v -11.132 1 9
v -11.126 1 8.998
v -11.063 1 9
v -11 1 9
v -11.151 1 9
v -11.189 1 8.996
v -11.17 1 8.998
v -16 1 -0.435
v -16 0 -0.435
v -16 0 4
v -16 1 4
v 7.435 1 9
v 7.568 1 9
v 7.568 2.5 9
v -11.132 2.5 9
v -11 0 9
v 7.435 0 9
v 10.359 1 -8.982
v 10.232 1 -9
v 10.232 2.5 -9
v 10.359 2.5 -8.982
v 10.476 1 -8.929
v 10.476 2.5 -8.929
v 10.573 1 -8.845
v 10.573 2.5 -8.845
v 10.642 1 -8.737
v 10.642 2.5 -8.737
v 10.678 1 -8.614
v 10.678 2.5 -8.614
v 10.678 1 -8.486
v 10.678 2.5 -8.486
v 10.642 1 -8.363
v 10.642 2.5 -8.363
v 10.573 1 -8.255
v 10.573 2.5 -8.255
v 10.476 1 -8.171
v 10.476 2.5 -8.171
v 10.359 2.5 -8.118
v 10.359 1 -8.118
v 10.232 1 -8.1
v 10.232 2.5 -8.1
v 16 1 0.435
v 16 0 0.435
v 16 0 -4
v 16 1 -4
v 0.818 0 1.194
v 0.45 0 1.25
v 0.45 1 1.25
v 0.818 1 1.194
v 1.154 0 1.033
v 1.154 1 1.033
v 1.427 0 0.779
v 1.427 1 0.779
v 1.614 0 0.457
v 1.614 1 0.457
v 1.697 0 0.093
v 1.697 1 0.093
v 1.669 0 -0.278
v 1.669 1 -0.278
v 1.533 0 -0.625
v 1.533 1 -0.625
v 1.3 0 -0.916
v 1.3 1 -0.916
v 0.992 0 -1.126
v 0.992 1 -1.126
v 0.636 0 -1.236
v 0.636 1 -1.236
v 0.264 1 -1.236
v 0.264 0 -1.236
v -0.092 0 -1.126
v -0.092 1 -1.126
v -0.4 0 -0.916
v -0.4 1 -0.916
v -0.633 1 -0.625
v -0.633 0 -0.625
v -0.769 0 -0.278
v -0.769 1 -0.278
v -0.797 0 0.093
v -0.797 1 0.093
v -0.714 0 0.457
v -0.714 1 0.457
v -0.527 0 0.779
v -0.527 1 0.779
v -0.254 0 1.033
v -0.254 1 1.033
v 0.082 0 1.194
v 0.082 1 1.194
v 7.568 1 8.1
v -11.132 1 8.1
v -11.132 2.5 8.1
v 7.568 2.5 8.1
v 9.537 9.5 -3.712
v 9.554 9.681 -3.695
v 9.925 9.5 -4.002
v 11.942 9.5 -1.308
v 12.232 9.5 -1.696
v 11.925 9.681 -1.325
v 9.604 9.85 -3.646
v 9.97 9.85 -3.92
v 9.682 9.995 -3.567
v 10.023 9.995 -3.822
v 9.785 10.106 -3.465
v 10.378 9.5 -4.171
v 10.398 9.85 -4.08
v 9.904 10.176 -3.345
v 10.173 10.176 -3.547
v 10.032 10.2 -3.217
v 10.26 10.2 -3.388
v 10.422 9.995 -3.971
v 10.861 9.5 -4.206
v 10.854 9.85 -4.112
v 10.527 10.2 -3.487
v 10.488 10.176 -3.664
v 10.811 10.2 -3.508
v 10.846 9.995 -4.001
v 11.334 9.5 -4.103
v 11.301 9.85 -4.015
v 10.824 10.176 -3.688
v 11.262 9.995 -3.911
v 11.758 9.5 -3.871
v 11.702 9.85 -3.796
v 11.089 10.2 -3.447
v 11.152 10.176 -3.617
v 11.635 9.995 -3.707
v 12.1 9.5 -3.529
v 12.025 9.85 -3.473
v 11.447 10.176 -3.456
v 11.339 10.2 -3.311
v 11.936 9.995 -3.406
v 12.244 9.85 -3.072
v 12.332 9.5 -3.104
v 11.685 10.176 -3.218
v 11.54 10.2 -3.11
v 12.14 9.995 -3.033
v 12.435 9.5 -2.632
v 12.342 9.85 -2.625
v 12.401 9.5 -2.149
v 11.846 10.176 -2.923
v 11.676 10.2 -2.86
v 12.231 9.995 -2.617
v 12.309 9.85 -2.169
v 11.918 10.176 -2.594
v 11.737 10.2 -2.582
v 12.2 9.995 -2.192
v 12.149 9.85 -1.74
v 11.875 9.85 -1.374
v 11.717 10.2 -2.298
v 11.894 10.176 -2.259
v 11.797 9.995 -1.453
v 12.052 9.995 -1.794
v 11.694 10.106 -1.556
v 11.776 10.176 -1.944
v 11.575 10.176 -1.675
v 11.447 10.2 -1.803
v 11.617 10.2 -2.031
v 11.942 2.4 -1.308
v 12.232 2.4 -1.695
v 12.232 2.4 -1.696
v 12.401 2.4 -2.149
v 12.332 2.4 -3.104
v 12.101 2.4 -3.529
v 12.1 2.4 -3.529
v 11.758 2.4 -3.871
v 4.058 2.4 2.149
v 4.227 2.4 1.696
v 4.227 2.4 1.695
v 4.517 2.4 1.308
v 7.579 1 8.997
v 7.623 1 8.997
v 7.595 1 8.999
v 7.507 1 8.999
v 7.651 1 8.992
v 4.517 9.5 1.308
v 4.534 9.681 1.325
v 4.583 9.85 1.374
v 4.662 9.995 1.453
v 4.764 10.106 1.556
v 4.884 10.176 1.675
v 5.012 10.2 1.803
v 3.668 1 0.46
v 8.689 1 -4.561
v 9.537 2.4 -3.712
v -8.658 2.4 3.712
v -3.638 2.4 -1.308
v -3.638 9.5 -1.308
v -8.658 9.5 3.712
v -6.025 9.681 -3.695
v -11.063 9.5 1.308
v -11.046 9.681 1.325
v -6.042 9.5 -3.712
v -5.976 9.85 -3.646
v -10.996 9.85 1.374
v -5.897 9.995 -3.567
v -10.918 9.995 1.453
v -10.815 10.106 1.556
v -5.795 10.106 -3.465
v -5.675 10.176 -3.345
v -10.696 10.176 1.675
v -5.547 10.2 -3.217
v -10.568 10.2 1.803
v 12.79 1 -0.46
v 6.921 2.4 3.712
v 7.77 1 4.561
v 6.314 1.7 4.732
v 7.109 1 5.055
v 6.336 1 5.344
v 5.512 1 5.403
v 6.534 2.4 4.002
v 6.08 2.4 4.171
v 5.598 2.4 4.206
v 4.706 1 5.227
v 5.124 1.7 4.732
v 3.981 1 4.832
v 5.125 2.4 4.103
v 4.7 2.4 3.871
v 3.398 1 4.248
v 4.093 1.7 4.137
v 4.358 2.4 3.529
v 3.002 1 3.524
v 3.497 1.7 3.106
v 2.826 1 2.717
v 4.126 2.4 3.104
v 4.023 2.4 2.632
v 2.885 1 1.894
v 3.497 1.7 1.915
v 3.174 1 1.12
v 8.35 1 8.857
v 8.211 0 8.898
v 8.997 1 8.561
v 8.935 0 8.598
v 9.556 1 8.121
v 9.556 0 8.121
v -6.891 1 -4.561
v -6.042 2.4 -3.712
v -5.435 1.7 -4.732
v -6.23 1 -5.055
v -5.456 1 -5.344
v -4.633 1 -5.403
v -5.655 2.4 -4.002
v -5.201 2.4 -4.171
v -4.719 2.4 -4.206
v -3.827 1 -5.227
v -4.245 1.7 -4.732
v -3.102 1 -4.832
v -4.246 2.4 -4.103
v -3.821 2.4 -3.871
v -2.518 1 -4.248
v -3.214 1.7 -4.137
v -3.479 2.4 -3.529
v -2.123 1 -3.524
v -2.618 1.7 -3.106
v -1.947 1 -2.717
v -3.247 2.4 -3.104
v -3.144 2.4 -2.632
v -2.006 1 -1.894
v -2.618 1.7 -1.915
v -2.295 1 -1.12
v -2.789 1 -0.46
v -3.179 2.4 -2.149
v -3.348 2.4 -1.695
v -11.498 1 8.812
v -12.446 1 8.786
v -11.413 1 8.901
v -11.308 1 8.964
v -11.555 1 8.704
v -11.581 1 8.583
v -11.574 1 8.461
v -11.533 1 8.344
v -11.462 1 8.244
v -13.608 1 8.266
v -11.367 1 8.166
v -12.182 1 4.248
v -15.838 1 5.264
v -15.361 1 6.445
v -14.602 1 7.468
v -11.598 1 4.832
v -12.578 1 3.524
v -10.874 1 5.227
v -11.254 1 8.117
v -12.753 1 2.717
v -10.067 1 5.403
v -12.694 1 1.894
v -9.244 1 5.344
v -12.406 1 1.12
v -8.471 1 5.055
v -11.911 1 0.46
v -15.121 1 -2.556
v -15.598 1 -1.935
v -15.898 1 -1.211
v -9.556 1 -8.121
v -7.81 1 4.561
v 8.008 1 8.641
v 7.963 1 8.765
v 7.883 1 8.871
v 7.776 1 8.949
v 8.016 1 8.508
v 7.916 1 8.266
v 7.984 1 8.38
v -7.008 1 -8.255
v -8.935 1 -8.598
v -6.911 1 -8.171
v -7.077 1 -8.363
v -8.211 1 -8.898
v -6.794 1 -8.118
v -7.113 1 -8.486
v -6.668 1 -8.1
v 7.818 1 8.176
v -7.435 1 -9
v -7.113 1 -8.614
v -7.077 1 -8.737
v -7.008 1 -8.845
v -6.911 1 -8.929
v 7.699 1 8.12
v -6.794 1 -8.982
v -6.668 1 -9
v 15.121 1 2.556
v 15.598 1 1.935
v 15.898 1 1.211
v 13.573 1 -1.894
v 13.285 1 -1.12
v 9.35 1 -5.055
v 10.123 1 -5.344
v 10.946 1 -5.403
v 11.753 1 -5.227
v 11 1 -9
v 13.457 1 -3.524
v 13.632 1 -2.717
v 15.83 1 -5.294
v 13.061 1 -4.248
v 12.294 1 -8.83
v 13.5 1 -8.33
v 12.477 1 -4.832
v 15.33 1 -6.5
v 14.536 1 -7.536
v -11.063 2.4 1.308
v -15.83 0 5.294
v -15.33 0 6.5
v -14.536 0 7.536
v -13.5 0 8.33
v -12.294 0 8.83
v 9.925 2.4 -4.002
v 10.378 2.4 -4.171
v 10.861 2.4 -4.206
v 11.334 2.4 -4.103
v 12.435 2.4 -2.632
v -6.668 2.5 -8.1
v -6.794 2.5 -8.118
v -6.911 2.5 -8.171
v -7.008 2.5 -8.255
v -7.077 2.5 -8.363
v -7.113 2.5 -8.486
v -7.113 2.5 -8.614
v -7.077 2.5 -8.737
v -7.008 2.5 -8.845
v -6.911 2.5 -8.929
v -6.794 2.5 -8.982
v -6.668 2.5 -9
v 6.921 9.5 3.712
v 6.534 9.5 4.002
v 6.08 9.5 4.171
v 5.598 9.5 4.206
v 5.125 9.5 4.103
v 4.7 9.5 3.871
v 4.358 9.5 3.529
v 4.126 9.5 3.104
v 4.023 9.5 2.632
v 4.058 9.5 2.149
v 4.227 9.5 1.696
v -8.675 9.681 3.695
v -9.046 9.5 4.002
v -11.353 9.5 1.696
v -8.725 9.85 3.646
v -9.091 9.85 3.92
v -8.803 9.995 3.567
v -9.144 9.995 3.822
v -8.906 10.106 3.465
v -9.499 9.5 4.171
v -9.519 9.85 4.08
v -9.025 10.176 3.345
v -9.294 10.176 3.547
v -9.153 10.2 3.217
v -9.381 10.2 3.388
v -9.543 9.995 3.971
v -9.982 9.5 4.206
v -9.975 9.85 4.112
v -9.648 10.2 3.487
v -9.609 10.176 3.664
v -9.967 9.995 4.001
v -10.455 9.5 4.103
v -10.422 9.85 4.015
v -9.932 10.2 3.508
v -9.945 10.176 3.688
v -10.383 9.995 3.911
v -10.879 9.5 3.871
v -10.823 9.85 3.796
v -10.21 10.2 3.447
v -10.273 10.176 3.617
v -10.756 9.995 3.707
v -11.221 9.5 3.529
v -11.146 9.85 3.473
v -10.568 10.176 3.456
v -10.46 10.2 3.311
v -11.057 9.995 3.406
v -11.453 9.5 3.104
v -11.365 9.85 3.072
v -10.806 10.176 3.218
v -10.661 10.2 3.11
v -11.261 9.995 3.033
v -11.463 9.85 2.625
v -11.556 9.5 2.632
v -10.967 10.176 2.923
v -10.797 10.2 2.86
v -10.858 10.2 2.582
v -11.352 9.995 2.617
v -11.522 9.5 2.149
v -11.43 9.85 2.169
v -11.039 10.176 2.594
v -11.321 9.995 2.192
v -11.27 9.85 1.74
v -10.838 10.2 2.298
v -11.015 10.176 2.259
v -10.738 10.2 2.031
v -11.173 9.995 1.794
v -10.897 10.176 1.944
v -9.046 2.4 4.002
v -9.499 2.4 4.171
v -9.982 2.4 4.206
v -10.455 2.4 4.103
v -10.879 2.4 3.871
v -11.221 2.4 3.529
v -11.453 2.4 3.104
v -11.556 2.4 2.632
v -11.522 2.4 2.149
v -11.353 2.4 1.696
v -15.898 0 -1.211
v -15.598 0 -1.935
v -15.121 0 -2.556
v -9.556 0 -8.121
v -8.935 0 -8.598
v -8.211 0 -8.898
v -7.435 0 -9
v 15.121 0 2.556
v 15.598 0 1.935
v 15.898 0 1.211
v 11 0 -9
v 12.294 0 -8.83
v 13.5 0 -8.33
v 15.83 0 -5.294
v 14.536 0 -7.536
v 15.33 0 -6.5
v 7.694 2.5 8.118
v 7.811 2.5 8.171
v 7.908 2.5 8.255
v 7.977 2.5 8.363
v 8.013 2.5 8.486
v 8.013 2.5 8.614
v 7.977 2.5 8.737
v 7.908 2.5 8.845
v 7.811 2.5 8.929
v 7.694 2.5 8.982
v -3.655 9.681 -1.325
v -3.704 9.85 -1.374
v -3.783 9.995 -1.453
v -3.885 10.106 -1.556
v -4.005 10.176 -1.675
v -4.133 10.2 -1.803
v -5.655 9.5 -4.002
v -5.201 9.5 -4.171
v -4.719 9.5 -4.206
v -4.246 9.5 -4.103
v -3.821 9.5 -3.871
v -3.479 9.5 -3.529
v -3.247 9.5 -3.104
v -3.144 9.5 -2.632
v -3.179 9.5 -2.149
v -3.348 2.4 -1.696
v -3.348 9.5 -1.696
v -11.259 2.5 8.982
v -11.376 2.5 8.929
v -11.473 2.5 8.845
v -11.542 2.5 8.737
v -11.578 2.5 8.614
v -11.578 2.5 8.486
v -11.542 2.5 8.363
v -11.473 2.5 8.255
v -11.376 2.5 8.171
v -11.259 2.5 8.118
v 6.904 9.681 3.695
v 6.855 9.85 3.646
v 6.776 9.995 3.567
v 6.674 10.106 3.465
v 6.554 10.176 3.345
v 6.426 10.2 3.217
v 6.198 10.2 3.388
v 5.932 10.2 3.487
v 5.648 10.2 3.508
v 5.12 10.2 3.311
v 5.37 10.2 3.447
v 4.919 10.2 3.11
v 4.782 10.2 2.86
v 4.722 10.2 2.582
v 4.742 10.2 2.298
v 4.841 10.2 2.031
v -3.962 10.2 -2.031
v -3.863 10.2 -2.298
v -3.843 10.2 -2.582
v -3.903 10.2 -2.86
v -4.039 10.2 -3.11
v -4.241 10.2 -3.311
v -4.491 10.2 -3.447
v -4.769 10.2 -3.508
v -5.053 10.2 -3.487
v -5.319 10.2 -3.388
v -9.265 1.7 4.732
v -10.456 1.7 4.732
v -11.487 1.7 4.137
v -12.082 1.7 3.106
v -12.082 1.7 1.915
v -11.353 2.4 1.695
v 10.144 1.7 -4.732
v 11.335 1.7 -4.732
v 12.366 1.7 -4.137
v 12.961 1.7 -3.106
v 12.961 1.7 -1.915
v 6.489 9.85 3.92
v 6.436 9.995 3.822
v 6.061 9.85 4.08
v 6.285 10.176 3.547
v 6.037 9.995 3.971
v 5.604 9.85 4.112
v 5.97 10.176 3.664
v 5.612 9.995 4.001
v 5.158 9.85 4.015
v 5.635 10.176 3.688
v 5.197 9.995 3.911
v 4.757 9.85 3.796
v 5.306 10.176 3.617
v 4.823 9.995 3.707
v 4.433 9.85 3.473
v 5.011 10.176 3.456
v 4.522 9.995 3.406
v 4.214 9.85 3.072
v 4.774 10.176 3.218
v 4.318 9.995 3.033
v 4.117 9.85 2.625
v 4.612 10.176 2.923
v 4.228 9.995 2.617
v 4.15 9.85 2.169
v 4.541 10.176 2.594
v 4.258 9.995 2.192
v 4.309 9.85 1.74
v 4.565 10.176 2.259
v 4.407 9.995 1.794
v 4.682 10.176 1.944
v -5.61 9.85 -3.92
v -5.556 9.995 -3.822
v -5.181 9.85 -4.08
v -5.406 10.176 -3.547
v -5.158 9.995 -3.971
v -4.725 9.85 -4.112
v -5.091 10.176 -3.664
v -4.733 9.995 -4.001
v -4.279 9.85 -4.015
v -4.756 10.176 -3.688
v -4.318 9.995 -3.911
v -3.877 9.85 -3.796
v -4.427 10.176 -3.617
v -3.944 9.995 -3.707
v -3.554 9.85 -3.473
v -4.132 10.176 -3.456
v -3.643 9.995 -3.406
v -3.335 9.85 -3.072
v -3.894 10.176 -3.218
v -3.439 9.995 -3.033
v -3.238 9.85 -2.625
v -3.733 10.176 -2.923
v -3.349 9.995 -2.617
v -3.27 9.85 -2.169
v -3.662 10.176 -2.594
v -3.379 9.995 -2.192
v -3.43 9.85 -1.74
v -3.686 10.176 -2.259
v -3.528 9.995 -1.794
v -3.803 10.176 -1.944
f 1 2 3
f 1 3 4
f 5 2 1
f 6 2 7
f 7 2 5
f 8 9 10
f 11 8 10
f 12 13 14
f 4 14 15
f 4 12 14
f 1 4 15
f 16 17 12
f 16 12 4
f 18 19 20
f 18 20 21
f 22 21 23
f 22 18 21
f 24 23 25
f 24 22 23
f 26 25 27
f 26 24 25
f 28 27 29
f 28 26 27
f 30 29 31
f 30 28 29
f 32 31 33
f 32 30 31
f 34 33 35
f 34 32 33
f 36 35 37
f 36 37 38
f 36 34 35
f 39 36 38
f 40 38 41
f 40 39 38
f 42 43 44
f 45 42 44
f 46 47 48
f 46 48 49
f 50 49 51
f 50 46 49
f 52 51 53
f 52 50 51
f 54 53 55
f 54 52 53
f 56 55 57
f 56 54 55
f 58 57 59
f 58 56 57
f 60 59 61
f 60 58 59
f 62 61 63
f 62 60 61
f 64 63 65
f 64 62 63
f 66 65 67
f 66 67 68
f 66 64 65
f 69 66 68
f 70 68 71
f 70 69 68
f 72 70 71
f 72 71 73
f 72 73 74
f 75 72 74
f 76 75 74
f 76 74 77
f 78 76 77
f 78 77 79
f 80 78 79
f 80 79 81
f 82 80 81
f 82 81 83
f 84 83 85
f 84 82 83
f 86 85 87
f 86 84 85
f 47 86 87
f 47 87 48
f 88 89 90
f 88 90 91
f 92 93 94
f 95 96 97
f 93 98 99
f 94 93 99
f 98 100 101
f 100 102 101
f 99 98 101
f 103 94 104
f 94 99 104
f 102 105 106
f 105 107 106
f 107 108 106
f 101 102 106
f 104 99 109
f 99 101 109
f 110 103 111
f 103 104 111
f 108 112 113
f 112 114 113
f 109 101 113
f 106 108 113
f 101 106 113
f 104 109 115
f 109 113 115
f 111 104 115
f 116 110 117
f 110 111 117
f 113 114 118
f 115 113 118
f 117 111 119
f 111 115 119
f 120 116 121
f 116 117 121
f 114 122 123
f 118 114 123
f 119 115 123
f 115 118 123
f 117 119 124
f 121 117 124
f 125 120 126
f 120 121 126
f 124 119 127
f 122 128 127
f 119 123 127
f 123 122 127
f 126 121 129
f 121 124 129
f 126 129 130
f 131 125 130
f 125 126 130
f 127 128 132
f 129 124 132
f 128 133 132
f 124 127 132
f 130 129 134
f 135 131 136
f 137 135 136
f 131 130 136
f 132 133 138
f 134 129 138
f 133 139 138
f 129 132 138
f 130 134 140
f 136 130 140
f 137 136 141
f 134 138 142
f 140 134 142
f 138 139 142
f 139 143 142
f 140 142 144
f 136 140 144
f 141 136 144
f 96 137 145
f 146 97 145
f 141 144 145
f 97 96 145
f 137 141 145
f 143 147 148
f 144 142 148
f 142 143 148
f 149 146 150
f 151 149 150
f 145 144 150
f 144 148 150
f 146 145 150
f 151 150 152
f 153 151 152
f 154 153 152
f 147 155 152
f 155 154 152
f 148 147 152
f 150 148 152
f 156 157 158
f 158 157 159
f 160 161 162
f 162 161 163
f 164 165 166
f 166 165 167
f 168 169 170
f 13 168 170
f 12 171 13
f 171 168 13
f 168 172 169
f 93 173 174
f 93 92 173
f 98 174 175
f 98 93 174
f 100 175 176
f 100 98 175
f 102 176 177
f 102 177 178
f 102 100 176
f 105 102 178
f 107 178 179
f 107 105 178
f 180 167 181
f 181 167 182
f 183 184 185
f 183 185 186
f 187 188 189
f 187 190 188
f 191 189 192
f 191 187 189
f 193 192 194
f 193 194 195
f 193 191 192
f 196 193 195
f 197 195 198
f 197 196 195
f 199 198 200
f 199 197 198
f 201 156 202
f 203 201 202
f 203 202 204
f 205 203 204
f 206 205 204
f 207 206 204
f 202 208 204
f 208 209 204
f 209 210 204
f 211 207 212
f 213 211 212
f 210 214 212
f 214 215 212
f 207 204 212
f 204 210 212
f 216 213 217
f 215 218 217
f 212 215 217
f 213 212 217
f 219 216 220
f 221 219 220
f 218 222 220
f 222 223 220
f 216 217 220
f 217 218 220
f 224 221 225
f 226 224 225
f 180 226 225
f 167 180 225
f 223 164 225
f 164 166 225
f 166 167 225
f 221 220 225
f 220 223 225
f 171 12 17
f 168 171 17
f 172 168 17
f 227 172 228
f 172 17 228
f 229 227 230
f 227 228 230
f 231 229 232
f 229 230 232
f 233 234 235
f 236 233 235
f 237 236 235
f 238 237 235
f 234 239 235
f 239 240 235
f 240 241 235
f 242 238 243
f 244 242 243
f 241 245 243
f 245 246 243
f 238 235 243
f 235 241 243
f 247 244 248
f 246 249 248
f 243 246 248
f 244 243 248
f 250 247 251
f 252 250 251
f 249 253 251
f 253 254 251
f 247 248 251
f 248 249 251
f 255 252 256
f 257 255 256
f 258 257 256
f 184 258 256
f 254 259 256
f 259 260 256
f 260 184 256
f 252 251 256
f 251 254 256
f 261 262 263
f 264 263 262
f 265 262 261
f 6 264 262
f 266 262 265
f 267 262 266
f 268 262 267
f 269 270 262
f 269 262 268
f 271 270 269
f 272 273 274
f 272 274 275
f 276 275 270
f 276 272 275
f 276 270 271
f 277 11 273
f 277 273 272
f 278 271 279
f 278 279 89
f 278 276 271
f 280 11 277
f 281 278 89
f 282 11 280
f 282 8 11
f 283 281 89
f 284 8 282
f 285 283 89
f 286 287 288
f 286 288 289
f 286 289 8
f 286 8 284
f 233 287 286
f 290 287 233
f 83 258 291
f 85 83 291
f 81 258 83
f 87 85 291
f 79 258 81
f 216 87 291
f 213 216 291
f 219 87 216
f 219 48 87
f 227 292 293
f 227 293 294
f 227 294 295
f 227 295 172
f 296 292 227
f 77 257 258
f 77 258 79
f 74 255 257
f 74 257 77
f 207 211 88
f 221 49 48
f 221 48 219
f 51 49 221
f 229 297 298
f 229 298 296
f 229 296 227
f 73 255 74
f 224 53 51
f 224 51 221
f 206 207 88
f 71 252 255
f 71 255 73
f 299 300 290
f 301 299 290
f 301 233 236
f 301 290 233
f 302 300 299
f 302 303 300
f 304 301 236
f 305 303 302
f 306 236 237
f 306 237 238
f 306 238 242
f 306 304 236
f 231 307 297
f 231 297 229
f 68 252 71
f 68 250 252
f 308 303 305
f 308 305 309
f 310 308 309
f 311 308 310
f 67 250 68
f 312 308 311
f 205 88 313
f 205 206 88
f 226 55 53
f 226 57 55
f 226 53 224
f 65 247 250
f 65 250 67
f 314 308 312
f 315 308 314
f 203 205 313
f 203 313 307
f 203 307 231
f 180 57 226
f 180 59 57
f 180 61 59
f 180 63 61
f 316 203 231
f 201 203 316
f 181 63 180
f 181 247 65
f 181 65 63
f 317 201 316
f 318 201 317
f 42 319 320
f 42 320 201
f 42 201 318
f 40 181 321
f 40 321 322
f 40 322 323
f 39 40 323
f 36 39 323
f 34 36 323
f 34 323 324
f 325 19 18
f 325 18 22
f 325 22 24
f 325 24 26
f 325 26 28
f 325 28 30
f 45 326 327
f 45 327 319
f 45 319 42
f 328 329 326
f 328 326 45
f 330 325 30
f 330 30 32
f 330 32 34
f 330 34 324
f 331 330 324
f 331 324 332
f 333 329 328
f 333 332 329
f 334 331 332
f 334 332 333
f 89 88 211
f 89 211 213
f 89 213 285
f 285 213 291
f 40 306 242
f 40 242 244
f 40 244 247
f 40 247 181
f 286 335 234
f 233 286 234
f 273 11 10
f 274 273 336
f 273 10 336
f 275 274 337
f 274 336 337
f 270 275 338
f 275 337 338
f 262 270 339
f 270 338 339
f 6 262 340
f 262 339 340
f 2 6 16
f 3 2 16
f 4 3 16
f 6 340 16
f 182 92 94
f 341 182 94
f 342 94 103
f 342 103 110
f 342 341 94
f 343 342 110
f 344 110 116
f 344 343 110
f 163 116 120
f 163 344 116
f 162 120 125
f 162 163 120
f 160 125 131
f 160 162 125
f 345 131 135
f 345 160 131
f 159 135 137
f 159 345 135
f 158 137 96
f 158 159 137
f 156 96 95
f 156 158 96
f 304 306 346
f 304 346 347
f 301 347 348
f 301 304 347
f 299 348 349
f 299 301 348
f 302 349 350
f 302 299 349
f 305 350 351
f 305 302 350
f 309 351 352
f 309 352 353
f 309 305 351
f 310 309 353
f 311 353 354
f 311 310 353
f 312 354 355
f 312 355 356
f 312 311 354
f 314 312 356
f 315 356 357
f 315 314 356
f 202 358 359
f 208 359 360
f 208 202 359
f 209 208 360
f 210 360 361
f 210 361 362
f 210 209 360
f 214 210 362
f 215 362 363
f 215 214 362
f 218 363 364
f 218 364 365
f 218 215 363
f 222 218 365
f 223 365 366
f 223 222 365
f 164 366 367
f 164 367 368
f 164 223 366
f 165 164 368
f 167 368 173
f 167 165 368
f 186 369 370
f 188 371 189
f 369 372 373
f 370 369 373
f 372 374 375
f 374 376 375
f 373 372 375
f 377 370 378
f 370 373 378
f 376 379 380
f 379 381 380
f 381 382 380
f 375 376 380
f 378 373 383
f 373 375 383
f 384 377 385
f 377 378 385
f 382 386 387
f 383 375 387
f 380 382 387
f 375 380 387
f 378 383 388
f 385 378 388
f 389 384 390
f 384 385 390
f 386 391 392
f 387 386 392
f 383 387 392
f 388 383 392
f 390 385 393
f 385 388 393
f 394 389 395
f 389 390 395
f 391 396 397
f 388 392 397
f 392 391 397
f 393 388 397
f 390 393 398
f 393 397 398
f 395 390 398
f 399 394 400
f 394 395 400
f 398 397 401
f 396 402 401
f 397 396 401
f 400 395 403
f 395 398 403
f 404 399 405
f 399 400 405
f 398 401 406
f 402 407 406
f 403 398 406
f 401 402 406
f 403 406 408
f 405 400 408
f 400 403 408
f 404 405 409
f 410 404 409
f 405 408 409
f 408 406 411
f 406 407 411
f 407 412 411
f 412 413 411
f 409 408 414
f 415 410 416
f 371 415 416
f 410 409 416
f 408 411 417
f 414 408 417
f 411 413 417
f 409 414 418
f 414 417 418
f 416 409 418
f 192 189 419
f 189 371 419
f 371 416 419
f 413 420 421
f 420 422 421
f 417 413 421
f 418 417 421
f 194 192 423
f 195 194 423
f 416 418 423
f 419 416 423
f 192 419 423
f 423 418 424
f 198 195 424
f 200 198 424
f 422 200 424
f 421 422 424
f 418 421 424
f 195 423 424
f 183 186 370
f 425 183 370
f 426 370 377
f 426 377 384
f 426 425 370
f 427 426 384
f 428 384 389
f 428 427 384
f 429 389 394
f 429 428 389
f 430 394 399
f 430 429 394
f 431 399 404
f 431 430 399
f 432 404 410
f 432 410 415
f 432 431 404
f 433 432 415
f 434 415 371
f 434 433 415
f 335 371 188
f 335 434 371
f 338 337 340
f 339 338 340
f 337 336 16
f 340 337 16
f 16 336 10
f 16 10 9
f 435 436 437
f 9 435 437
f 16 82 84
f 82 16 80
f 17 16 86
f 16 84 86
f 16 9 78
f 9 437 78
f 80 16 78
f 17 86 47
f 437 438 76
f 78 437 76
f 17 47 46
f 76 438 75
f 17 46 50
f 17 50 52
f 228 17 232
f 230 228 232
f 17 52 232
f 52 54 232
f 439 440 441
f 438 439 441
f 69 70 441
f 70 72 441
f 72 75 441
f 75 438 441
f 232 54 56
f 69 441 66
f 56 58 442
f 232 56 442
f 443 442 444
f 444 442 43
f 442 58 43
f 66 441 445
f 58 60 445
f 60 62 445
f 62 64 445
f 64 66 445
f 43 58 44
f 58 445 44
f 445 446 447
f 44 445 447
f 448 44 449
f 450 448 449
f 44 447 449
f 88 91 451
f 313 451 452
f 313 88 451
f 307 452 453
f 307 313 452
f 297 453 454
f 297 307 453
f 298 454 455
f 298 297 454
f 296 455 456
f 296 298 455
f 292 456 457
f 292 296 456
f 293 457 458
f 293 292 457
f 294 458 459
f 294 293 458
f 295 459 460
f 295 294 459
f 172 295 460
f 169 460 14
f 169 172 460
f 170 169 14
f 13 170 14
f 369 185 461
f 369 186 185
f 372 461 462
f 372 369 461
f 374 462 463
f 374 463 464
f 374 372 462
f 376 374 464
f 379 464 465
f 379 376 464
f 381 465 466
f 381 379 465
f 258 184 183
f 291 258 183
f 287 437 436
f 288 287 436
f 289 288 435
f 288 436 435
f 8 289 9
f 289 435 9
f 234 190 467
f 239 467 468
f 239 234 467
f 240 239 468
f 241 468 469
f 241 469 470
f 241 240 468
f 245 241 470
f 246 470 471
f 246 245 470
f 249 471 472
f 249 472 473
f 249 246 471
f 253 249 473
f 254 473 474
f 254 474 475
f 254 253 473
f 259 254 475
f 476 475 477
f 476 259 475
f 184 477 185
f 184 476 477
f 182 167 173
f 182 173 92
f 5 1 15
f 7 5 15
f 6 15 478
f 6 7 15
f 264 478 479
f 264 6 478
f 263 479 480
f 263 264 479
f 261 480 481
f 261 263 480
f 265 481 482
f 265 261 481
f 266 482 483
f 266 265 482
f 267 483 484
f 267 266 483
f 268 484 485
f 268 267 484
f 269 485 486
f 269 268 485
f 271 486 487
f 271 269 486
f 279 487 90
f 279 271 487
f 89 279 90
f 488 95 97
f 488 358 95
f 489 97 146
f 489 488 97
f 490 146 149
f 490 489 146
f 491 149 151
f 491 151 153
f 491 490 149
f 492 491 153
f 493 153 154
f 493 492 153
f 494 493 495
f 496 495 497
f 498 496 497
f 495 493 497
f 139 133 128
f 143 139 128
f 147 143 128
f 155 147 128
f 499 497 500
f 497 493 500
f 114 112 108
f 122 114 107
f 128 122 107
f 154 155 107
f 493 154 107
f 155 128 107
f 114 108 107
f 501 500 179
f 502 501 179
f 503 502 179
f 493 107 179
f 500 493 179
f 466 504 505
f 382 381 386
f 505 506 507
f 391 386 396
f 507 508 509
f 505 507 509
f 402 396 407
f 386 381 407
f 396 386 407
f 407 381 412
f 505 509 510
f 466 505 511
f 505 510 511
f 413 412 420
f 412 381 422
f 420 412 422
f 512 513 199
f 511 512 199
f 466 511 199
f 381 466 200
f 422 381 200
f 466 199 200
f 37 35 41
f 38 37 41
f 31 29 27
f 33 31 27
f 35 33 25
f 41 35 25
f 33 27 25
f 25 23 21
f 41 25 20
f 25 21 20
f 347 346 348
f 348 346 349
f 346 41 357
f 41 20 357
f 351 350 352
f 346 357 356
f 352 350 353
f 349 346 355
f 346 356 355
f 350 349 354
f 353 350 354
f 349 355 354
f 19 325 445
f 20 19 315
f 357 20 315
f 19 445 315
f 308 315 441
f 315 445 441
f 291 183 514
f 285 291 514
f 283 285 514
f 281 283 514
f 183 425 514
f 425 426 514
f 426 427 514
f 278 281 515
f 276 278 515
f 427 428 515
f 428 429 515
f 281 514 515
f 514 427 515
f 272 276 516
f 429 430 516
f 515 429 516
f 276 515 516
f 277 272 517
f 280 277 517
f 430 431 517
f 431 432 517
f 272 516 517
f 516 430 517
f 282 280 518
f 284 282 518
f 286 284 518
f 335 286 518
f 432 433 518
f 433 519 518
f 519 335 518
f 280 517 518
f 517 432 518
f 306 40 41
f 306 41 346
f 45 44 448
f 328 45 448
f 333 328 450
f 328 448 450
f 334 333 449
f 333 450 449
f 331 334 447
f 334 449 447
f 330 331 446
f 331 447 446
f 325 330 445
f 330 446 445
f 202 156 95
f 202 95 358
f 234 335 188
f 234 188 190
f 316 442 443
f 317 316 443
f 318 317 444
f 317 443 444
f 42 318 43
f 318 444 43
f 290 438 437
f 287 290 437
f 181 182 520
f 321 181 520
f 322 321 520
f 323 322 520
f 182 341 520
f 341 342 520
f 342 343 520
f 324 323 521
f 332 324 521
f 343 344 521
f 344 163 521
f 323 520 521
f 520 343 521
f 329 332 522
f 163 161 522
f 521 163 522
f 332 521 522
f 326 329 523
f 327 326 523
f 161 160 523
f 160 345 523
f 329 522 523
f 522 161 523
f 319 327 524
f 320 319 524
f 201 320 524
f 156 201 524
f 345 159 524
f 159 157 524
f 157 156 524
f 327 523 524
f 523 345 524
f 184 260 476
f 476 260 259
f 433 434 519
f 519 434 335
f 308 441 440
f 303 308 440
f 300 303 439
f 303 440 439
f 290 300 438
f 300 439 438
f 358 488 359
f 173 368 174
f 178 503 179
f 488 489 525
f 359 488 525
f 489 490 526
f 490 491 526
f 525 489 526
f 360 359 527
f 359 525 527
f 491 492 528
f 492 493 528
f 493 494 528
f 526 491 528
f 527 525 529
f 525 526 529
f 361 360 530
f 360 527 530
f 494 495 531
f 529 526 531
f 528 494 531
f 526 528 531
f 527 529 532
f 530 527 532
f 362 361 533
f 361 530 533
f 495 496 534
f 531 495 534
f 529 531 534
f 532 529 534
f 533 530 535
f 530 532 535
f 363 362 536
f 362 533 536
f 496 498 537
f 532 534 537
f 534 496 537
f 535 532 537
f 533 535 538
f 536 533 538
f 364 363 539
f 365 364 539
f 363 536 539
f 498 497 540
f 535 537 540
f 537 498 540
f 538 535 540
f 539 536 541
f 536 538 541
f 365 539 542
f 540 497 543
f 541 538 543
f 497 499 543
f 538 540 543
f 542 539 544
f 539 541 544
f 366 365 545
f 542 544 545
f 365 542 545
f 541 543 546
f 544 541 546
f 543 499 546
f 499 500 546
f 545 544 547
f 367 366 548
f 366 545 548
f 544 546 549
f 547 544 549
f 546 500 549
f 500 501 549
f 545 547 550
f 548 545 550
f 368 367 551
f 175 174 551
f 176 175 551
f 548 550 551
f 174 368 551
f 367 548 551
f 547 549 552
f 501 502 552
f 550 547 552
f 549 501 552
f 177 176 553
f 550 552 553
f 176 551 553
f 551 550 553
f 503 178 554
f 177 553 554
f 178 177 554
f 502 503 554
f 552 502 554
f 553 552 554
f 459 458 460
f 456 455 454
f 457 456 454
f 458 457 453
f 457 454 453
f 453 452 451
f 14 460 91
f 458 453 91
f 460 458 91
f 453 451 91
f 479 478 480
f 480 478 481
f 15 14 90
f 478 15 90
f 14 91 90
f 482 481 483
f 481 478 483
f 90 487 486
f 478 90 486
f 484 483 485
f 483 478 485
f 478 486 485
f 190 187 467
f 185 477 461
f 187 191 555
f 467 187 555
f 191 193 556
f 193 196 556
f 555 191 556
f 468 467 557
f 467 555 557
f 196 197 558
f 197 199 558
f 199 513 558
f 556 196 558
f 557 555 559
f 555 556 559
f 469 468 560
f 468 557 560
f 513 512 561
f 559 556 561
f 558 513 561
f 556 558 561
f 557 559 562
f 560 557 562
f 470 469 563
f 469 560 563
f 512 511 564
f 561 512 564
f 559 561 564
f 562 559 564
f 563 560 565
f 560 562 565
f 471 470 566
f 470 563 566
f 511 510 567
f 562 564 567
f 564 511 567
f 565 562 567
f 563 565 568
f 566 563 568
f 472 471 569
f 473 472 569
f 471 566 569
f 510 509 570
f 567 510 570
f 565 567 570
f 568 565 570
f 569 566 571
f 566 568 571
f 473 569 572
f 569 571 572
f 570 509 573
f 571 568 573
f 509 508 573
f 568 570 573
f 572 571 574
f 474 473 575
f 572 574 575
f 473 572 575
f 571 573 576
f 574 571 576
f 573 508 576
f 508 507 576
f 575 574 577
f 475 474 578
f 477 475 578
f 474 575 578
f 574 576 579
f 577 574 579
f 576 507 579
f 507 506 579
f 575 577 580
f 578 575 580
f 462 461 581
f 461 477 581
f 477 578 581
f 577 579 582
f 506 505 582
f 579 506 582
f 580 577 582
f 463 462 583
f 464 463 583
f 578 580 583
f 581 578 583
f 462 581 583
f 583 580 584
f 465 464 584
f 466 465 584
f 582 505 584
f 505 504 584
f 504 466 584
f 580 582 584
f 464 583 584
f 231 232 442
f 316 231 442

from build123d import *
from OCP.BRepFilletAPI import BRepFilletAPI_MakeChamfer

# Parameters (mm, degrees)
ESQUISSE1_R        = 1.25
BOSS_EXTRU_1_DEPTH = 1
BOSS_EXTRU_2_DEPTH = 9.2
CONG_1_R           = 0.7
BOSS_EXTRU_3_DEPTH = 1.4
CHANFREIN1_SIZE    = 1.4
CHANFREIN1_SIZE_2  = 1.2
BOSS_EXTRU_4_DEPTH = 1.5


with BuildPart() as part:
    # Esquisse1 → Boss.-Extru.1 (new body)
    with BuildSketch(Plane(origin=(0, 0, 0), x_dir=(1, 0, 0), z_dir=(0, 1, 0))):
        with BuildLine():
            Line((-11, -9), (7.435028843, -9))
            ThreePointArc((7.435028843, -9), (8.58307914, -8.771638598), (9.556349186, -8.121320344))
            Line((9.556349186, -8.121320344), (15.121320344, -2.556349186))
            ThreePointArc((15.121320344, -2.556349186), (15.771638598, -1.58307914), (16, -0.435028843))
            Line((16, -0.435028843), (16, 4))
            ThreePointArc((16, 4), (14.535533906, 7.535533906), (11, 9))
            Line((11, 9), (-7.435028843, 9))
            ThreePointArc((-7.435028843, 9), (-8.58307914, 8.771638598), (-9.556349186, 8.121320344))
            Line((-9.556349186, 8.121320344), (-15.121320344, 2.556349186))
            ThreePointArc((-15.121320344, 2.556349186), (-15.771638598, 1.58307914), (-16, 0.435028843))
            Line((-16, 0.435028843), (-16, -4))
            ThreePointArc((-16, -4), (-14.535533906, -7.535533906), (-11, -9))
        make_face()
        with Locations(Location((0.45, 0, 0), (0, 0, 270))):
            Circle(ESQUISSE1_R, mode=Mode.SUBTRACT)
    extrude(amount=BOSS_EXTRU_1_DEPTH)

    # Esquisse2 → Boss.-Extru.2 (add)
    with BuildSketch(Plane(origin=(0, 1, 0), x_dir=(1, 0, 0), z_dir=(0, 1, 0))):
        with BuildLine():
            Line((-11.062539674, -1.308147545), (-6.042081528, 3.712310601))
            ThreePointArc((-6.042081528, 3.712310601), (-3.637918472, 3.712310601), (-3.637918472, 1.308147545))
            Line((-3.637918472, 1.308147545), (-8.658376618, -3.712310601))
            ThreePointArc((-8.658376618, -3.712310601), (-11.062539674, -3.712310601), (-11.062539674, -1.308147545))
        make_face()
        with BuildLine():
            Line((4.517002179, -1.308147545), (9.537460326, 3.712310601))
            ThreePointArc((9.537460326, 3.712310601), (11.941623382, 3.712310601), (11.941623382, 1.308147545))
            Line((11.941623382, 1.308147545), (6.921165235, -3.712310601))
            ThreePointArc((6.921165235, -3.712310601), (4.517002179, -3.712310601), (4.517002179, -1.308147545))
        make_face()
    extrude(amount=BOSS_EXTRU_2_DEPTH)

    # Congé1
    cong_1_edges = [part.edges().sort_by_distance(p)[0] for p in [
        (-11.062539674, 10.2, 3.712310601),
        (-6.148147545, 10.2, 1.202081528),
        (-3.637918472, 10.2, -3.712310601),
        (-8.552310601, 10.2, -1.202081528),
        (4.517002179, 10.2, 3.712310601),
        (9.431394308, 10.2, 1.202081528),
        (11.941623382, 10.2, -3.712310601),
        (7.027231252, 10.2, -1.202081528),
    ]]
    fillet(cong_1_edges, radius=CONG_1_R)

    # Esquisse3 → Boss.-Extru.3 (add)
    with BuildSketch(Plane(origin=(0, 1, 0), x_dir=(1, 0, 0), z_dir=(0, 1, 0))):
        with BuildLine():
            Line((-11.911067812, -0.459619408), (-6.890609665, 4.560838739))
            ThreePointArc((-6.890609665, 4.560838739), (-2.789390335, 4.560838739), (-2.789390335, 0.459619408))
            Line((-2.789390335, 0.459619408), (-7.809848481, -4.560838739))
            ThreePointArc((-7.809848481, -4.560838739), (-11.911067812, -4.560838739), (-11.911067812, -0.459619408))
        make_face()
        with BuildLine():
            Line((3.668474042, -0.459619408), (8.688932188, 4.560838739))
            ThreePointArc((8.688932188, 4.560838739), (12.790151519, 4.560838739), (12.790151519, 0.459619408))
            Line((12.790151519, 0.459619408), (7.769693373, -4.560838739))
            ThreePointArc((7.769693373, -4.560838739), (3.668474042, -4.560838739), (3.668474042, -0.459619408))
        make_face()
    extrude(amount=BOSS_EXTRU_3_DEPTH)

    # Chanfrein1
    chanfrein1_edges_1 = [part.edges().sort_by_distance(p)[0] for p in [
        (12.790151519, 2.4, -4.560838739),
    ]]
    chanfrein1_side_1 = [part.faces().sort_by_distance(p)[0] for p in [
        (12.790151519, 2.376, -4.560838739),
    ]]
    chanfrein1_edges_2 = [part.edges().sort_by_distance(p)[0] for p in [
        (6.178703115, 2.4, -2.050609665),
    ]]
    chanfrein1_side_2 = [part.faces().sort_by_distance(p)[0] for p in [
        (6.178703115, 2.376, -2.050609665),
    ]]
    chanfrein1_edges_3 = [part.edges().sort_by_distance(p)[0] for p in [
        (3.668474042, 2.4, 4.560838739),
    ]]
    chanfrein1_side_3 = [part.faces().sort_by_distance(p)[0] for p in [
        (3.668474042, 2.376, 4.560838739),
    ]]
    chanfrein1_edges_4 = [part.edges().sort_by_distance(p)[0] for p in [
        (10.279922446, 2.4, 2.050609665),
    ]]
    chanfrein1_side_4 = [part.faces().sort_by_distance(p)[0] for p in [
        (10.279922446, 2.376, 2.050609665),
    ]]
    chanfrein1_edges_5 = [part.edges().sort_by_distance(p)[0] for p in [
        (-2.789390335, 2.4, -4.560838739),
    ]]
    chanfrein1_side_5 = [part.faces().sort_by_distance(p)[0] for p in [
        (-2.789390335, 2.376, -4.560838739),
    ]]
    chanfrein1_edges_6 = [part.edges().sort_by_distance(p)[0] for p in [
        (-9.400838739, 2.4, -2.050609665),
    ]]
    chanfrein1_side_6 = [part.faces().sort_by_distance(p)[0] for p in [
        (-9.400838739, 2.376, -2.050609665),
    ]]
    chanfrein1_edges_7 = [part.edges().sort_by_distance(p)[0] for p in [
        (-11.911067812, 2.4, 4.560838739),
    ]]
    chanfrein1_side_7 = [part.faces().sort_by_distance(p)[0] for p in [
        (-11.911067812, 2.376, 4.560838739),
    ]]
    chanfrein1_edges_8 = [part.edges().sort_by_distance(p)[0] for p in [
        (-5.299619408, 2.4, 2.050609665),
    ]]
    chanfrein1_side_8 = [part.faces().sort_by_distance(p)[0] for p in [
        (-5.299619408, 2.376, 2.050609665),
    ]]
    chanfrein1 = BRepFilletAPI_MakeChamfer(part.part.solid().wrapped)
    for e in chanfrein1_edges_1:
        chanfrein1.Add(CHANFREIN1_SIZE - 0.0001, CHANFREIN1_SIZE_2 - 0.0001, e.wrapped, chanfrein1_side_1[0].wrapped)
    for e in chanfrein1_edges_2:
        chanfrein1.Add(CHANFREIN1_SIZE - 0.0001, CHANFREIN1_SIZE_2 - 0.0001, e.wrapped, chanfrein1_side_2[0].wrapped)
    for e in chanfrein1_edges_3:
        chanfrein1.Add(CHANFREIN1_SIZE - 0.0001, CHANFREIN1_SIZE_2 - 0.0001, e.wrapped, chanfrein1_side_3[0].wrapped)
    for e in chanfrein1_edges_4:
        chanfrein1.Add(CHANFREIN1_SIZE - 0.0001, CHANFREIN1_SIZE_2 - 0.0001, e.wrapped, chanfrein1_side_4[0].wrapped)
    for e in chanfrein1_edges_5:
        chanfrein1.Add(CHANFREIN1_SIZE - 0.0001, CHANFREIN1_SIZE_2 - 0.0001, e.wrapped, chanfrein1_side_5[0].wrapped)
    for e in chanfrein1_edges_6:
        chanfrein1.Add(CHANFREIN1_SIZE - 0.0001, CHANFREIN1_SIZE_2 - 0.0001, e.wrapped, chanfrein1_side_6[0].wrapped)
    for e in chanfrein1_edges_7:
        chanfrein1.Add(CHANFREIN1_SIZE - 0.0001, CHANFREIN1_SIZE_2 - 0.0001, e.wrapped, chanfrein1_side_7[0].wrapped)
    for e in chanfrein1_edges_8:
        chanfrein1.Add(CHANFREIN1_SIZE - 0.0001, CHANFREIN1_SIZE_2 - 0.0001, e.wrapped, chanfrein1_side_8[0].wrapped)
    add(Compound.cast(chanfrein1.Shape()), mode=Mode.REPLACE)  # a hair under: the kernel refuses the full size

    # Esquisse4 → Boss.-Extru.4 (add)
    with BuildSketch(Plane(origin=(0, 1, 0), x_dir=(1, 0, 0), z_dir=(0, 1, 0))):
        with BuildLine():
            Line((-6.667514421, 9), (10.232485579, 9))
            ThreePointArc((10.232485579, 9), (10.682485579, 8.55), (10.232485579, 8.1))
            Line((10.232485579, 8.1), (-6.667514421, 8.1))
            ThreePointArc((-6.667514421, 8.1), (-7.117514421, 8.55), (-6.667514421, 9))
        make_face()
        with BuildLine():
            Line((-11.132485579, -8.1), (7.567514421, -8.1))
            ThreePointArc((7.567514421, -8.1), (8.017514421, -8.55), (7.567514421, -9))
            Line((7.567514421, -9), (-11.132485579, -9))
            ThreePointArc((-11.132485579, -9), (-11.582485579, -8.55), (-11.132485579, -8.1))
        make_face()
    extrude(amount=BOSS_EXTRU_4_DEPTH)


solid = part.part
